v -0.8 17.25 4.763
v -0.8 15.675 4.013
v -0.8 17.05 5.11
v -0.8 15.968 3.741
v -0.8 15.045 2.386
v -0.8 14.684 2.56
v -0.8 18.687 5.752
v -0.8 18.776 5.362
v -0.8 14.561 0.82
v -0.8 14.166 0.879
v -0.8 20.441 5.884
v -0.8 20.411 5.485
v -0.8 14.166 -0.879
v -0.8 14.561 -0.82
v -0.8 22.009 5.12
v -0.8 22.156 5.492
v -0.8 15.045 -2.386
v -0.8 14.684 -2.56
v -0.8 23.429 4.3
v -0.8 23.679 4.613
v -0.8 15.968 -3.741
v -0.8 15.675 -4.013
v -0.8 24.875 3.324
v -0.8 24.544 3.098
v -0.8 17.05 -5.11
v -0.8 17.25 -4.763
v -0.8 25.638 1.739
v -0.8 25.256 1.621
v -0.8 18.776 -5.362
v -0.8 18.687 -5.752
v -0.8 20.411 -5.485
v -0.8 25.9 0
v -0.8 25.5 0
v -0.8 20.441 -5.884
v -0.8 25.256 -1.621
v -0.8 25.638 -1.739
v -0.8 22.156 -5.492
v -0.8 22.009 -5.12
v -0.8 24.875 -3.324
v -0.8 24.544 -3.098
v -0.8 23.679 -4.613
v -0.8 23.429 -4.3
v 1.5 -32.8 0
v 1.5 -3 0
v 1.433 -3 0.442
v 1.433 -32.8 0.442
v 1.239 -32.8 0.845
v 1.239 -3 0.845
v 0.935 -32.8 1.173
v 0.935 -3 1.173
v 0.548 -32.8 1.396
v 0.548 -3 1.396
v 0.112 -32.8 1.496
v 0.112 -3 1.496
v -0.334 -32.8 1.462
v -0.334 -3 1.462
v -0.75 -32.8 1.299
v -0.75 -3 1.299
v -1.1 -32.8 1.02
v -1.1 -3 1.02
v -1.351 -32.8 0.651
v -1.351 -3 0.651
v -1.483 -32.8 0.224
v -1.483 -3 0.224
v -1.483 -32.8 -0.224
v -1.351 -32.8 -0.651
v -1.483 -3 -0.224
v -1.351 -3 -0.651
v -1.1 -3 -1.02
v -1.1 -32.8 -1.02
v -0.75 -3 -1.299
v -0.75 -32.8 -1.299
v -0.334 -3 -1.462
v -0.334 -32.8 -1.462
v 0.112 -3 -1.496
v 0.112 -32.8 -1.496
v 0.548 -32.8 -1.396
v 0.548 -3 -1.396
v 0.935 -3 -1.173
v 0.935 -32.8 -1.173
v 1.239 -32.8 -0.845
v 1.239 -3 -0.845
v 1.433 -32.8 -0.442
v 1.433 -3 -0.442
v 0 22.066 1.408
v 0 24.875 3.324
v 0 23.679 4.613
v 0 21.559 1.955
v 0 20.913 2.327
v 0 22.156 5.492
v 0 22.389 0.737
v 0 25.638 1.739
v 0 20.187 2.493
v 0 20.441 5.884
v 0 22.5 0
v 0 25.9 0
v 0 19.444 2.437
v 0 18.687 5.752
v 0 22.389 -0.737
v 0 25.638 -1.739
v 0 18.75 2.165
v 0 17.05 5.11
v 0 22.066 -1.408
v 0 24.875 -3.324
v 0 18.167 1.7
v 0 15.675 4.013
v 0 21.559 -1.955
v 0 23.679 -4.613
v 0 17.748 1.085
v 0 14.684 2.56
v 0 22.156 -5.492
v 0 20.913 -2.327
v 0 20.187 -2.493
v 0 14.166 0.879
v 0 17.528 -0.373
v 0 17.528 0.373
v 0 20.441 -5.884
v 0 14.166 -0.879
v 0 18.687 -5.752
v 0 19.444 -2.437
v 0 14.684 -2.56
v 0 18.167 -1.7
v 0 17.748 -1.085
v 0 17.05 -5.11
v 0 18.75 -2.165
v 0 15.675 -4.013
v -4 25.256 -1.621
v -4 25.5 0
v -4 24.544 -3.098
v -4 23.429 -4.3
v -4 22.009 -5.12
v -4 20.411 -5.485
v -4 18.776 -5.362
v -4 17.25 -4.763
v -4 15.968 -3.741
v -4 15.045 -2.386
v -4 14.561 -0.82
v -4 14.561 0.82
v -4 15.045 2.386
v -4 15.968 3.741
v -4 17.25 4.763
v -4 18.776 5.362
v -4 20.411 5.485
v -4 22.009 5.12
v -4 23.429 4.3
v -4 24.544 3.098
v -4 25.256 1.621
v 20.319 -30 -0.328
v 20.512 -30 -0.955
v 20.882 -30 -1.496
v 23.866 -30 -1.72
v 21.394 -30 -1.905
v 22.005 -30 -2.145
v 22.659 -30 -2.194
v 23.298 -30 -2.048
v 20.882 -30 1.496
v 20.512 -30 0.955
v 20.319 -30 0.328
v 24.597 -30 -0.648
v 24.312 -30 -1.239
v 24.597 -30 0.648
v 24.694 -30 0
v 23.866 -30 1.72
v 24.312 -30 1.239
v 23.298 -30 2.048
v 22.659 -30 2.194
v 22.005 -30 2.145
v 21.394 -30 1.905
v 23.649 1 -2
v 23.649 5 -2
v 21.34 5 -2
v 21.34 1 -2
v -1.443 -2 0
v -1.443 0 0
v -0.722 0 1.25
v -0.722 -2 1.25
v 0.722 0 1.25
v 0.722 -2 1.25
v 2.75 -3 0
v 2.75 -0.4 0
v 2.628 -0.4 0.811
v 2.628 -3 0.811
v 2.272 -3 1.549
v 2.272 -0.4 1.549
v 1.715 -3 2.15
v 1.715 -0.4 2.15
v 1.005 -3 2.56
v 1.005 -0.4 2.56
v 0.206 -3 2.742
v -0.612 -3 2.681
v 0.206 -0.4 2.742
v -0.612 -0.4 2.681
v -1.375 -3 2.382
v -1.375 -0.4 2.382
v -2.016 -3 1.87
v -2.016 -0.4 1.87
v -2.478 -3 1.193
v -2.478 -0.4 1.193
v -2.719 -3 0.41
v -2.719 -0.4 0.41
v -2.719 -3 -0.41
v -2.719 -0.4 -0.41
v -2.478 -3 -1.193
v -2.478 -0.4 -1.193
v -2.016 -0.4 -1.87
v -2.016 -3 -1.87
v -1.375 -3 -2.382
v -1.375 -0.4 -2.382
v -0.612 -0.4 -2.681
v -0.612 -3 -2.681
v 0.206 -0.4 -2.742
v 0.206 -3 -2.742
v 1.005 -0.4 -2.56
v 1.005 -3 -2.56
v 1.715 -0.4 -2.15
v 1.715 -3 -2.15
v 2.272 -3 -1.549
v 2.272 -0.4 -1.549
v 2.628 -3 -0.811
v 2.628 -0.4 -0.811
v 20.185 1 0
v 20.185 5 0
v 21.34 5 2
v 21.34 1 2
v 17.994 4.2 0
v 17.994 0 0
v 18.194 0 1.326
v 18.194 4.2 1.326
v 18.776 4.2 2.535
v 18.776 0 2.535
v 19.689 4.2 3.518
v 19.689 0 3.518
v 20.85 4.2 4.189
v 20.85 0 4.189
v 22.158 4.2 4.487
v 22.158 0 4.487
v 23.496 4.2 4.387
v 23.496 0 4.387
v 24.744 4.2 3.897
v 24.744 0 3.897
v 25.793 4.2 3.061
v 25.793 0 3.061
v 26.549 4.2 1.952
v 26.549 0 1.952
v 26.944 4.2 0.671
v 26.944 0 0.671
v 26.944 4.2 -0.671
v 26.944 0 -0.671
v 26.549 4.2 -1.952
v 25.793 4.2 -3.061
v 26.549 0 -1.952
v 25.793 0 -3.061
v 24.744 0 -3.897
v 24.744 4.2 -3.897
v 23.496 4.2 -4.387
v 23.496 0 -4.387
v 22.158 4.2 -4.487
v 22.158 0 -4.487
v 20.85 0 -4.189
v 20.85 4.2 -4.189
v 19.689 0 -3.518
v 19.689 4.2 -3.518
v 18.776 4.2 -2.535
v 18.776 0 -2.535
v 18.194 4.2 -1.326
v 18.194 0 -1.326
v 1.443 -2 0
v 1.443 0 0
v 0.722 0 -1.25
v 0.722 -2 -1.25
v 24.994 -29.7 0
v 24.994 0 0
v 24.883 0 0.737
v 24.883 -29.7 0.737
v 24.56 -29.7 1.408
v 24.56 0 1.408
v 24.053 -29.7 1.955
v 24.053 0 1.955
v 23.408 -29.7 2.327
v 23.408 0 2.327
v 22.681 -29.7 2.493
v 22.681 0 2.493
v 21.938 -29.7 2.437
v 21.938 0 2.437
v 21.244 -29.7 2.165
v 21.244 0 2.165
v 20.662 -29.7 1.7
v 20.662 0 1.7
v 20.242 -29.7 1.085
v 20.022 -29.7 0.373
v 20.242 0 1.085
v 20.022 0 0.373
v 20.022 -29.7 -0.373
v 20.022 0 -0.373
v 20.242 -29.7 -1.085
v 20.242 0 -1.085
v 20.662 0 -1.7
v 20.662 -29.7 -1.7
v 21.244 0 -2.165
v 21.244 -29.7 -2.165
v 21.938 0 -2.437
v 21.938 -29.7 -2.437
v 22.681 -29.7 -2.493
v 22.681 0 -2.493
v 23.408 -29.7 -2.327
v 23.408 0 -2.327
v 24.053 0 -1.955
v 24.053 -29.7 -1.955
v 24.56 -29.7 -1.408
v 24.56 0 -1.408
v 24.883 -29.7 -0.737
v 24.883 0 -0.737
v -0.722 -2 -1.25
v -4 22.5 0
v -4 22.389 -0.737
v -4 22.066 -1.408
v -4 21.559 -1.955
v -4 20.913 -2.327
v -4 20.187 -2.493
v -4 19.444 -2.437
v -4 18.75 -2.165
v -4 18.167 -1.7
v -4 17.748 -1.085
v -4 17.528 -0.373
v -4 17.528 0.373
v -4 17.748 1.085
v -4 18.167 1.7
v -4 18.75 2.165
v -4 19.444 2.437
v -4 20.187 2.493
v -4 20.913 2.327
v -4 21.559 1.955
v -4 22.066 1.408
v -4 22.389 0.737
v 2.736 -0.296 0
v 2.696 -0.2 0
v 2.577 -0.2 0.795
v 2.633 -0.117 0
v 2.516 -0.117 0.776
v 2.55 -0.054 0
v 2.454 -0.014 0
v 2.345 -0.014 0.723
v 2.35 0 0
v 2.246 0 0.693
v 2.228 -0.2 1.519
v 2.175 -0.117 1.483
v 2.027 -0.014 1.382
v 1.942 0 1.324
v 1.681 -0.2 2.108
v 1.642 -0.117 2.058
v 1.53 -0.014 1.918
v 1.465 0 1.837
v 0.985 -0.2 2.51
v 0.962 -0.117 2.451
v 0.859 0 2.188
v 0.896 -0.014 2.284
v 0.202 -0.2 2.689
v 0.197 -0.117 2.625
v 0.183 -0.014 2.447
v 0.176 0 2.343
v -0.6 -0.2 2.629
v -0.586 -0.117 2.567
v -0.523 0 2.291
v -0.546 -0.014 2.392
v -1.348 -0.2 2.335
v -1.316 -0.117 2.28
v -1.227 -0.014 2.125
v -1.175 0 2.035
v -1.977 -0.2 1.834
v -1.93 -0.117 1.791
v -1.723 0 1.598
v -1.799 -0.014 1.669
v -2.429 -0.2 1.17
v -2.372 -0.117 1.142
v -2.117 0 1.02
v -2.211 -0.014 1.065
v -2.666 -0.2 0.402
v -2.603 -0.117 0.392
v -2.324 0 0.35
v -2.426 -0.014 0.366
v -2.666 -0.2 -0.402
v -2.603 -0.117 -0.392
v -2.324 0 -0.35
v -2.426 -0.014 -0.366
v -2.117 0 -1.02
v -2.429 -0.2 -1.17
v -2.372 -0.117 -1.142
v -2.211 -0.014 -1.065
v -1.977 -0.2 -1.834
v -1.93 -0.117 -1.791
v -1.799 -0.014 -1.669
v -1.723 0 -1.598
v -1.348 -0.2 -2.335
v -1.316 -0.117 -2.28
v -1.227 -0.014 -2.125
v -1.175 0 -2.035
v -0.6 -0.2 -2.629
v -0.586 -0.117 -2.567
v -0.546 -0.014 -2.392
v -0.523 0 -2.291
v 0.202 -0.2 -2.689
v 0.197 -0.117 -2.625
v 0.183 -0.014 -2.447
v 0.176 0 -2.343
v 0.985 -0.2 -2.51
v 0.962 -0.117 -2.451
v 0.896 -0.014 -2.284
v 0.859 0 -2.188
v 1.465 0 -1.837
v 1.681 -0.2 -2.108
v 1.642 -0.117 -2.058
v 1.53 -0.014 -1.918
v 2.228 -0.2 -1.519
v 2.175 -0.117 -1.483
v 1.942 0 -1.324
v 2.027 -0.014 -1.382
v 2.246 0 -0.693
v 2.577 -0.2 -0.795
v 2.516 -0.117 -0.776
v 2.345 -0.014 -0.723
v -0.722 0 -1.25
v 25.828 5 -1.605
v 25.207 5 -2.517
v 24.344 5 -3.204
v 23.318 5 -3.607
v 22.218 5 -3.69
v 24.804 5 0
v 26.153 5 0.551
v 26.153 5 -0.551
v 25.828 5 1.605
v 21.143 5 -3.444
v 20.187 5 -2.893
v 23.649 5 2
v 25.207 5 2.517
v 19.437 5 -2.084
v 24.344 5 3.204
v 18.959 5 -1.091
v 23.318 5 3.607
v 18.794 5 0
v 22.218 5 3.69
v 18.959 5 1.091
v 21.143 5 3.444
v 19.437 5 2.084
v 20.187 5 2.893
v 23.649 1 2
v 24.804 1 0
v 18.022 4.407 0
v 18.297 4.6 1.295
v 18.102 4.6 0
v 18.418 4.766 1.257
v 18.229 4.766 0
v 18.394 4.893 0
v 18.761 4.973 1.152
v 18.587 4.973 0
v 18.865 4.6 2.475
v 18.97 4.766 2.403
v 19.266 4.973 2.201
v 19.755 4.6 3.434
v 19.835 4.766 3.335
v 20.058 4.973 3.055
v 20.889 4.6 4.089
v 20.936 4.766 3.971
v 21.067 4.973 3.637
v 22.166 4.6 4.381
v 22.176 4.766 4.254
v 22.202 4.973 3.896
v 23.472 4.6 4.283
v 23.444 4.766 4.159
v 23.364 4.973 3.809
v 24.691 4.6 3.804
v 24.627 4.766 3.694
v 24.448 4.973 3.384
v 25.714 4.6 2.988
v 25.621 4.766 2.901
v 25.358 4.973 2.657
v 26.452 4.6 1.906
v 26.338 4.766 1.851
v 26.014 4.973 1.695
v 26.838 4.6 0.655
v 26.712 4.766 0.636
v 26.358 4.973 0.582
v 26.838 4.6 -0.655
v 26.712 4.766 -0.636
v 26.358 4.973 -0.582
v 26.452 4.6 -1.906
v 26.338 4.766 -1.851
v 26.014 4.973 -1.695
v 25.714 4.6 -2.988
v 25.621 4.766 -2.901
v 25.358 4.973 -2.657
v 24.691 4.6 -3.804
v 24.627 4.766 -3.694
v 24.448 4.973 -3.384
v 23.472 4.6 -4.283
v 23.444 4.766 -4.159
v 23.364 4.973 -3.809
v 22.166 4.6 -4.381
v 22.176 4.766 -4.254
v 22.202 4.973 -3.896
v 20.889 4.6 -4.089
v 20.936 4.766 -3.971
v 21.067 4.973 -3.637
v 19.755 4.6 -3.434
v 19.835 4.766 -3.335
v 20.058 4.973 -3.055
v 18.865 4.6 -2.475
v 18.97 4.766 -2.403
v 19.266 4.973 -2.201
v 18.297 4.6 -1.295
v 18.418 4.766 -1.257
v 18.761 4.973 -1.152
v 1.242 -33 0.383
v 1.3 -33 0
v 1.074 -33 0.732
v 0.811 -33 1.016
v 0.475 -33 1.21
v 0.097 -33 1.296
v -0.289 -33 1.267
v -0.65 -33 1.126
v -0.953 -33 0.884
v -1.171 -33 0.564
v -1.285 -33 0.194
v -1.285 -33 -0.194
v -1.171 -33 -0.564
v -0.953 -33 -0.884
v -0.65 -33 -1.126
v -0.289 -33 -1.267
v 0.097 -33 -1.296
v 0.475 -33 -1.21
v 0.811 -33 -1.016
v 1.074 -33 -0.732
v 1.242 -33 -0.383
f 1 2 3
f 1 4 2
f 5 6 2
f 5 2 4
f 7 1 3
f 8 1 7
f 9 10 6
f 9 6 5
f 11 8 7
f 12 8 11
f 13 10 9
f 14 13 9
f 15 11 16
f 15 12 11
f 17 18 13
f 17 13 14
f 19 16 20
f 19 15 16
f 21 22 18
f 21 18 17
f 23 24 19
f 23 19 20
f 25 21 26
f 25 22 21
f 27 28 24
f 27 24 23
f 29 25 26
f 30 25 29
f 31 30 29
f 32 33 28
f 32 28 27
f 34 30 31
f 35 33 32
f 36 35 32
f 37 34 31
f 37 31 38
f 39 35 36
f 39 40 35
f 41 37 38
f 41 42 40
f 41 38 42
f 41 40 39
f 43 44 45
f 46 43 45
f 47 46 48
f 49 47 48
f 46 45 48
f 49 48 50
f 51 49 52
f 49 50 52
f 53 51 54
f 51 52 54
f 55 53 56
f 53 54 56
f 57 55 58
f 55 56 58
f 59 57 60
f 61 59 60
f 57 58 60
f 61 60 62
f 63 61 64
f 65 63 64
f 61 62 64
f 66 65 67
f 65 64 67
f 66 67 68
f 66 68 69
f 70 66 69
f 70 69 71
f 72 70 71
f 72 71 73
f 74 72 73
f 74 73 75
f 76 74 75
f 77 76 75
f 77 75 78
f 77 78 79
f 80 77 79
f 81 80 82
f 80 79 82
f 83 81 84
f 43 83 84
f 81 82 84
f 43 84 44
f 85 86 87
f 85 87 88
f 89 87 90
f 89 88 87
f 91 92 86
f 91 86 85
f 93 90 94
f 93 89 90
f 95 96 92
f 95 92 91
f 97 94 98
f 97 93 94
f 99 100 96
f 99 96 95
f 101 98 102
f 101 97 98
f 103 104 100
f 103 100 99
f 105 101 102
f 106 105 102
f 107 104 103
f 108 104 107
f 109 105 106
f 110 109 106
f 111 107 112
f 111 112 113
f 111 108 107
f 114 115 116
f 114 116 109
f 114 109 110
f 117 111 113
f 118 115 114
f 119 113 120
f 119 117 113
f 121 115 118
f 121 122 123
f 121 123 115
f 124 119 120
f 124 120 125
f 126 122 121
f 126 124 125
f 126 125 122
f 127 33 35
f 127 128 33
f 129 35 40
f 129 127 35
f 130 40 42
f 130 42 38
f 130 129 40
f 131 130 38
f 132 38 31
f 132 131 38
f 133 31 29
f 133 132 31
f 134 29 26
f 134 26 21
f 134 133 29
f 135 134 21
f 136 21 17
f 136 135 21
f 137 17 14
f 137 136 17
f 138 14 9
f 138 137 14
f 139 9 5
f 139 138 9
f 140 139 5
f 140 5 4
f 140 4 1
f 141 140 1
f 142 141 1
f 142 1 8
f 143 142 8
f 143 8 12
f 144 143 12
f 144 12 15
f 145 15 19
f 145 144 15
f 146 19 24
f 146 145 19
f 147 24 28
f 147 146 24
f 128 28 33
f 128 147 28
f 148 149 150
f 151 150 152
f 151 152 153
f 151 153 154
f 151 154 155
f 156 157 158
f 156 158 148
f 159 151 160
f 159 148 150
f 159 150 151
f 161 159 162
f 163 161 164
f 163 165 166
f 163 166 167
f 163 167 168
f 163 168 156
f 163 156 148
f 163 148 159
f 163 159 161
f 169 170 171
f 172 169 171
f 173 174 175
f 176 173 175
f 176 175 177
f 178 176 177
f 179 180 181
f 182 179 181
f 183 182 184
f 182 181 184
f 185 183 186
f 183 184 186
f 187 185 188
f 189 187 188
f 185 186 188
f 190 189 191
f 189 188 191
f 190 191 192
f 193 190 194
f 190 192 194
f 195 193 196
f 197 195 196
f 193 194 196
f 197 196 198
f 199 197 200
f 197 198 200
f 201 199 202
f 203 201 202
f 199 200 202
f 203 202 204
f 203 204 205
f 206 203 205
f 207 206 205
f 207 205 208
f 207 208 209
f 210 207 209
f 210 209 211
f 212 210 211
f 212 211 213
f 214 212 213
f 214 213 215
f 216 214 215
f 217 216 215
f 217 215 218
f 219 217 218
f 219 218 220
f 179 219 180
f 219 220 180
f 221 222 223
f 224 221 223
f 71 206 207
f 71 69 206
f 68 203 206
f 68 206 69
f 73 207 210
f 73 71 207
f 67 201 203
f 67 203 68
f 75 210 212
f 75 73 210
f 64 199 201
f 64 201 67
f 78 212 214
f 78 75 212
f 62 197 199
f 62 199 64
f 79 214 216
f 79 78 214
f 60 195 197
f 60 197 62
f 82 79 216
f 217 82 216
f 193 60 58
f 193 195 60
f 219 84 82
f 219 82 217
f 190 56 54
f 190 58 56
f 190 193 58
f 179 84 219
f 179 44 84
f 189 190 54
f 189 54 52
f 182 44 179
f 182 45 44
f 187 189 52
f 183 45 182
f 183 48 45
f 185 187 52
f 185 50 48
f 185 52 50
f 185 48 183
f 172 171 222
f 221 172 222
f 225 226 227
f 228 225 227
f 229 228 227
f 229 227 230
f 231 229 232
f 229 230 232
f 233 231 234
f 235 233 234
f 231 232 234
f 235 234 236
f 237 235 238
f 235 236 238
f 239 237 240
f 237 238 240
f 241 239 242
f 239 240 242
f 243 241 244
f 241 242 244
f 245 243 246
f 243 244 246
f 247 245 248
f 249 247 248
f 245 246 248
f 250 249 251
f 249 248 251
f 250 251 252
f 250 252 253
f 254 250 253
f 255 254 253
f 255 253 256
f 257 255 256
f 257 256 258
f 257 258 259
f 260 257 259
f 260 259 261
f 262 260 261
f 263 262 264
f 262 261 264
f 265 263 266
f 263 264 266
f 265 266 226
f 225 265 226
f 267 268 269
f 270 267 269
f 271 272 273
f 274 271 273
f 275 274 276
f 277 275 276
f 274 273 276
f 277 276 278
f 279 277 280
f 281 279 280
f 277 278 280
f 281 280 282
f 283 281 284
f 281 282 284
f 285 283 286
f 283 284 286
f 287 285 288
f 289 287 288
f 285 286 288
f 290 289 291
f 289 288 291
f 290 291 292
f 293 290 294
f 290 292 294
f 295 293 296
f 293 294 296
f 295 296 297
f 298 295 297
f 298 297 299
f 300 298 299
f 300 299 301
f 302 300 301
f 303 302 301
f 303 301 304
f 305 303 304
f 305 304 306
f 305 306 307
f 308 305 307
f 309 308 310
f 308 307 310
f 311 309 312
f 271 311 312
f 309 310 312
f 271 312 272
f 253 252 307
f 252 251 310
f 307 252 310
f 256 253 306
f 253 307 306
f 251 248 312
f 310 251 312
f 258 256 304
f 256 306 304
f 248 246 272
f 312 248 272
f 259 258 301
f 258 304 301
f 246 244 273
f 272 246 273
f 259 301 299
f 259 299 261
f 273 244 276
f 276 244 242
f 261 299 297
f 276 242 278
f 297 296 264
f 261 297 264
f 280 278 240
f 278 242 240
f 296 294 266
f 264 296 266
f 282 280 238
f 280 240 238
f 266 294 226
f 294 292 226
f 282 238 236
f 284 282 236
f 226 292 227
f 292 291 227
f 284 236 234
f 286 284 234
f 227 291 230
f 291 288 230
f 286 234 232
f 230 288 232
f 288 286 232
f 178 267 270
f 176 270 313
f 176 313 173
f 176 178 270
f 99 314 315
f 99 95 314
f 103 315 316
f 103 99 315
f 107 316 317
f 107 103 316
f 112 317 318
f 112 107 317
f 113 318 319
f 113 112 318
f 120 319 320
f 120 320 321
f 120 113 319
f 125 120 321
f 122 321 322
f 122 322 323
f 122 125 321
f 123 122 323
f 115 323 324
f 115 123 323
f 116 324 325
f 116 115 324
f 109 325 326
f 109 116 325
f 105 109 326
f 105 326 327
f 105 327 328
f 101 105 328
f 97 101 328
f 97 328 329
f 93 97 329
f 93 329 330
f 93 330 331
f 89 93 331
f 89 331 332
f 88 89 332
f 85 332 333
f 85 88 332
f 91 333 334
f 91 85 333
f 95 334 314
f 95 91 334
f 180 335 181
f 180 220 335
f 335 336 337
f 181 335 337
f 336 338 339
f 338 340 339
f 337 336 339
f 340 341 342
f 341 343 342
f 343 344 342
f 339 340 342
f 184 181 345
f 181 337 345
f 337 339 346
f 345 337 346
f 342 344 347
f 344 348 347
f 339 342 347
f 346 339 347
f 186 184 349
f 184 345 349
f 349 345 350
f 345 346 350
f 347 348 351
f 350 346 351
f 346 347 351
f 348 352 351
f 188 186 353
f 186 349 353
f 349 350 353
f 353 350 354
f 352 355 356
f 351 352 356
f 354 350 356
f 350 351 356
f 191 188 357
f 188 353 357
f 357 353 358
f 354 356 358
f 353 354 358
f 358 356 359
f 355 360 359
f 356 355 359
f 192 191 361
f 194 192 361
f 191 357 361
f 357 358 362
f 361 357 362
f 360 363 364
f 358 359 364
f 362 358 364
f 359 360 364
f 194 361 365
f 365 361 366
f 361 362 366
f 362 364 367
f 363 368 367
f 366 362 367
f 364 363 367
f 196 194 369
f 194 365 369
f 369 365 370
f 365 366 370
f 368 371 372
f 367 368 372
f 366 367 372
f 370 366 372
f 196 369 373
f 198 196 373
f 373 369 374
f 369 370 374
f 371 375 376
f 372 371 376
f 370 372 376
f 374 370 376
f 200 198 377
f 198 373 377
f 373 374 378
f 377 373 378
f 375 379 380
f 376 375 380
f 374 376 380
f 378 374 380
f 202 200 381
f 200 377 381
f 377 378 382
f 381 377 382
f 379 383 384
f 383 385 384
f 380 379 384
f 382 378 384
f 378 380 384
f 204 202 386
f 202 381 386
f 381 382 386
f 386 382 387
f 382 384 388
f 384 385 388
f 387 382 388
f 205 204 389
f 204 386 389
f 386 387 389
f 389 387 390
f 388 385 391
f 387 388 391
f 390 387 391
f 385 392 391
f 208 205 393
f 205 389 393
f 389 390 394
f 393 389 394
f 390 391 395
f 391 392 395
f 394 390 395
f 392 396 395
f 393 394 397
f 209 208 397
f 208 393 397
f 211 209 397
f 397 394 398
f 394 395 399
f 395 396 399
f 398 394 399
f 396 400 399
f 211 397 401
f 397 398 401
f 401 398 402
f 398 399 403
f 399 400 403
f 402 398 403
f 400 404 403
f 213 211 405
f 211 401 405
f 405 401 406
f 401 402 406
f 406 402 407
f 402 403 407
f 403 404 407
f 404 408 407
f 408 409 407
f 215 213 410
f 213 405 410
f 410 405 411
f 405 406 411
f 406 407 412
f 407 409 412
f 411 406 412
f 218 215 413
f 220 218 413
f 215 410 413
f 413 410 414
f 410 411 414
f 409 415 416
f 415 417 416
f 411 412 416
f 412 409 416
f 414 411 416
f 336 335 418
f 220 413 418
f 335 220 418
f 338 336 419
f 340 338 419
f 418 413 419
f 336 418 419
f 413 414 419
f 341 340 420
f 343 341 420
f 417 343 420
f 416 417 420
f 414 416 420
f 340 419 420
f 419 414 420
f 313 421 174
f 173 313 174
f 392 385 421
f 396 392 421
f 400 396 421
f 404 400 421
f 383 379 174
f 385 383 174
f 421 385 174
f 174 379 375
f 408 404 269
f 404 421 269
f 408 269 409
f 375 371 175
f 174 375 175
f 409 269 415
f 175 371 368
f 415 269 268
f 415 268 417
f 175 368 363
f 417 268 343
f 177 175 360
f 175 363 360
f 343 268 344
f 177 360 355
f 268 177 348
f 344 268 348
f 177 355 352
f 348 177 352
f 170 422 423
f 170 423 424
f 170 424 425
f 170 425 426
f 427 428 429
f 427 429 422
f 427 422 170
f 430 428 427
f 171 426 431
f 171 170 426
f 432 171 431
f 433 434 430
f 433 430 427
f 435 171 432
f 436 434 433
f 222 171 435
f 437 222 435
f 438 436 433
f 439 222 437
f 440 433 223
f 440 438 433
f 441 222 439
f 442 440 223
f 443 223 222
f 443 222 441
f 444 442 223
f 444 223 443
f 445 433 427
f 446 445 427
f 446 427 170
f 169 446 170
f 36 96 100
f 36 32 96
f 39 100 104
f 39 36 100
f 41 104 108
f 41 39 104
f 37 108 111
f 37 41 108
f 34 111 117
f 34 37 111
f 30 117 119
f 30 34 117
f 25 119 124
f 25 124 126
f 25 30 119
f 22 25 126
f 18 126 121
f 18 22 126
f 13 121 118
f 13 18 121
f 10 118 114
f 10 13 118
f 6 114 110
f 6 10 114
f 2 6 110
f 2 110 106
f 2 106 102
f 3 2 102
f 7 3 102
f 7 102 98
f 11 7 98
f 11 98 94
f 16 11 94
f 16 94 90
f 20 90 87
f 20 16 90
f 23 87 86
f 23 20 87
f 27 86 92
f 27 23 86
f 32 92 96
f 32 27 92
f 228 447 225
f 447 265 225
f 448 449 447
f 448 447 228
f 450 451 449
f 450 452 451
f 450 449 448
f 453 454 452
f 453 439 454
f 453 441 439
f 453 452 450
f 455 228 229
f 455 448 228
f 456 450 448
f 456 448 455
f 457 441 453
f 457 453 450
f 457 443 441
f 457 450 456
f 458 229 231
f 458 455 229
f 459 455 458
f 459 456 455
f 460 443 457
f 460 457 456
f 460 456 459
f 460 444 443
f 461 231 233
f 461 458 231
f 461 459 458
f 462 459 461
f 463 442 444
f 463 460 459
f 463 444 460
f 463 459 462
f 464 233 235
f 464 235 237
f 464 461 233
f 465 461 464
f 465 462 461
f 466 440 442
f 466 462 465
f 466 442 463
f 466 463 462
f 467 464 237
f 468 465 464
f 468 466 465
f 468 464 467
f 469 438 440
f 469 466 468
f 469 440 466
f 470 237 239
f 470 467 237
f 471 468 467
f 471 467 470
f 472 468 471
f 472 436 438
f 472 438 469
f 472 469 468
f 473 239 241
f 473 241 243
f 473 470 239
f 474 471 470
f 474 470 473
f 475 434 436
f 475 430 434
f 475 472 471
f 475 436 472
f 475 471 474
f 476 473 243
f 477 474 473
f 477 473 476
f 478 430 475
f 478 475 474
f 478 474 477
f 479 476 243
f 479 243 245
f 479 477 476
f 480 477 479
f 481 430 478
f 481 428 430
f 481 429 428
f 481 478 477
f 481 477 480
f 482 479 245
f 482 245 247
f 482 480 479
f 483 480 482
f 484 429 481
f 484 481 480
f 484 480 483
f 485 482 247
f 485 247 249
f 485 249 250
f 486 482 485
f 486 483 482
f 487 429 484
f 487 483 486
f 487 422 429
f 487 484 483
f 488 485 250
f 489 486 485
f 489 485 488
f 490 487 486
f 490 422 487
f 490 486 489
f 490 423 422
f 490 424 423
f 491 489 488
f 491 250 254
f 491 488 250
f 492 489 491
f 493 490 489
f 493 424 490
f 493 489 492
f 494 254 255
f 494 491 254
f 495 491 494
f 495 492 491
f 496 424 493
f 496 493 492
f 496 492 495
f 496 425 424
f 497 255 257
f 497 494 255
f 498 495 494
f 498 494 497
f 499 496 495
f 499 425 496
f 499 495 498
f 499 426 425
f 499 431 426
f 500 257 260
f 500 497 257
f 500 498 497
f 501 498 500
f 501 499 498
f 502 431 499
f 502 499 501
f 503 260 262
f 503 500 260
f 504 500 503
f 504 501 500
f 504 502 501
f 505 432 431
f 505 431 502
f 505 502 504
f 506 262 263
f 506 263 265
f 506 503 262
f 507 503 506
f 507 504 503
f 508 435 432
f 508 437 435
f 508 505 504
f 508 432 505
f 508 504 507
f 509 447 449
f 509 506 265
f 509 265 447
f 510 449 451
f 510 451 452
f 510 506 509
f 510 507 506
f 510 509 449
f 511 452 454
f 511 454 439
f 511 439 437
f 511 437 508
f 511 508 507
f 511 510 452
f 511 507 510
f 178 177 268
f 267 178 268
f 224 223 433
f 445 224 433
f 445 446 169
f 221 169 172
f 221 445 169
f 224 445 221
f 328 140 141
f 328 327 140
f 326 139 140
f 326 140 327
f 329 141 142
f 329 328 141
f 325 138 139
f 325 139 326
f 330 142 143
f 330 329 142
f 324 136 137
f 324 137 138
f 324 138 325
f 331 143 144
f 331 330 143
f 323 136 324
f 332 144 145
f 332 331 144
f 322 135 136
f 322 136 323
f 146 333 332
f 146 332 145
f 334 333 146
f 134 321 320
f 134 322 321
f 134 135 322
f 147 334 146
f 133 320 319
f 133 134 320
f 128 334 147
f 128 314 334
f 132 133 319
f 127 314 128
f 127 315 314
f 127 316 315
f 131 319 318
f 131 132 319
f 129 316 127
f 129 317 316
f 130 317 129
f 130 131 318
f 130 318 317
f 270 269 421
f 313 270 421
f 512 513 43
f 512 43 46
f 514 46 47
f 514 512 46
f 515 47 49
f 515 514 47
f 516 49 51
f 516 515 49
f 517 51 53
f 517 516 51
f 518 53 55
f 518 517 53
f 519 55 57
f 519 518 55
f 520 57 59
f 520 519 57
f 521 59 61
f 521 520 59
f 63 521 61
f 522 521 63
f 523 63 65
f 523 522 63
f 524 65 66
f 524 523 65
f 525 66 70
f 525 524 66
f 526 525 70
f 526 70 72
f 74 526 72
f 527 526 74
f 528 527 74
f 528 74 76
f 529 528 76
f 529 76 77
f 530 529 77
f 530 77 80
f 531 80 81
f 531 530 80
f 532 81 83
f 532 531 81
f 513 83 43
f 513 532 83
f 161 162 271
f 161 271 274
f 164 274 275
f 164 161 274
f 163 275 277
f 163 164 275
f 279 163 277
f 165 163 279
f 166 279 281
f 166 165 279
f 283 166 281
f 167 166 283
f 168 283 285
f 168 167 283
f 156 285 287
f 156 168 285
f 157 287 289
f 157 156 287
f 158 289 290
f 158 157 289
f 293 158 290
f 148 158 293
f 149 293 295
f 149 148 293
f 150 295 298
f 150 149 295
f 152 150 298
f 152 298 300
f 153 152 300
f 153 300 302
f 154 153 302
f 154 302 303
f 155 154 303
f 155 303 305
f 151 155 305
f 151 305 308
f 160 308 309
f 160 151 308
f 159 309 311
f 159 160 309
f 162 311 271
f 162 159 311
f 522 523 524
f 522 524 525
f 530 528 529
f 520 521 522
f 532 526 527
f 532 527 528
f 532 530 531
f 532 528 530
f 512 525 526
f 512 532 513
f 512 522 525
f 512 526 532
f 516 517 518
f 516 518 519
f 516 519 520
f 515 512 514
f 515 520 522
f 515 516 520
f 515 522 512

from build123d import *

# Parameters (mm, degrees)
F0_R      = 2.75
F1_DEPTH  = 3
F2_R      = 1.5
F3_DEPTH  = 30
F4_SIZE   = 0.2
F6_DEPTH  = 2
F7_R      = 0.4
F8_R      = 2.5
F9_DEPTH  = 30
F10_R     = 4.5
F10_R_2   = 2.5
F11_DEPTH = 5
F12_R     = 0.8
F13_SIZE  = 0.3
F15_DEPTH = 4


with BuildPart() as f1:
    # F0 (on Front) → F1 (new body)
    with BuildSketch(Plane.XZ):
        Circle(F0_R)
    extrude(amount=F1_DEPTH)

    # F2 (on face) → F3 (join)
    with BuildSketch(Plane.XZ.offset(3)):
        Circle(F2_R)
    extrude(amount=F3_DEPTH)

    # F4
    f4_edges = [f1.edges().sort_by_distance(p)[0] for p in [
        (-1.5, -33, 0),
    ]]
    chamfer(f4_edges, length=F4_SIZE)

    # F5 (on face) → F6 (cut)
    with BuildSketch(Plane(origin=(0, 0, 0), x_dir=(-1, 0, 0), z_dir=(0, 1, 0))):
        Polygon((1.443375673, 0), (0.7216878365, 1.25), (-0.7216878365, 1.25), (-1.443375673, 0), (-0.7216878365, -1.25), (0.7216878365, -1.25), align=None)
    extrude(amount=-F6_DEPTH, mode=Mode.SUBTRACT)

    # F7
    f7_edges = [f1.edges().sort_by_distance(p)[0] for p in [
        (-2.75, 0, 0),
    ]]
    fillet(f7_edges, radius=F7_R)


with BuildPart() as f9:
    # F8 (on Front) → F9 (new body)
    with BuildSketch(Plane.XZ):
        with Locations((22.4943347275, 0)):
            Circle(F8_R)
    extrude(amount=F9_DEPTH)

    # F10 (on face) → F11 (join)
    with BuildSketch(Plane(origin=(0, 0, 0), x_dir=(-1, 0, 0), z_dir=(0, 1, 0))):
        with Locations((-22.4943347275, 0)):
            Circle(F10_R)
        with Locations((-22.4943347275, 0)):
            Circle(F10_R_2, mode=Mode.SUBTRACT)
        with Locations((-22.4943347275, 0)):
            Circle(F10_R_2)
    extrude(amount=F11_DEPTH)

    # F12
    f12_edges = [f9.edges().sort_by_distance(p)[0] for p in [
        (26.994335, 5, 0),
    ]]
    fillet(f12_edges, radius=F12_R)

    # F13
    f13_edges = [f9.edges().sort_by_distance(p)[0] for p in [
        (19.994335, -30, 0),
    ]]
    chamfer(f13_edges, length=F13_SIZE)

    # F14 (on face) → F15 (cut)
    with BuildSketch(Plane(origin=(0, 5, 0), x_dir=(-1, 0, 0), z_dir=(0, 1, 0))):
        Polygon((-23.6490352659, -2), (-21.3396341891, -2), (-20.1849336508, 0), (-21.3396341891, 2), (-23.6490352659, 2), (-24.8037358043, 0), align=None)
    extrude(amount=-F15_DEPTH, mode=Mode.SUBTRACT)


with BuildPart() as f17:
    # F16 (on Top) → F17 (revolve)
    with BuildSketch(Plane.XY):
        Polygon((0, 22.5), (0, 25.9), (-0.8, 25.9), (-0.8, 25.5), (-4, 25.5), (-4, 22.5), align=None)
    revolve(axis=Axis((-6.1384743312, 20, 0), (-1, 0, 0)))


solid = Compound([f1.part, f9.part, f17.part])
